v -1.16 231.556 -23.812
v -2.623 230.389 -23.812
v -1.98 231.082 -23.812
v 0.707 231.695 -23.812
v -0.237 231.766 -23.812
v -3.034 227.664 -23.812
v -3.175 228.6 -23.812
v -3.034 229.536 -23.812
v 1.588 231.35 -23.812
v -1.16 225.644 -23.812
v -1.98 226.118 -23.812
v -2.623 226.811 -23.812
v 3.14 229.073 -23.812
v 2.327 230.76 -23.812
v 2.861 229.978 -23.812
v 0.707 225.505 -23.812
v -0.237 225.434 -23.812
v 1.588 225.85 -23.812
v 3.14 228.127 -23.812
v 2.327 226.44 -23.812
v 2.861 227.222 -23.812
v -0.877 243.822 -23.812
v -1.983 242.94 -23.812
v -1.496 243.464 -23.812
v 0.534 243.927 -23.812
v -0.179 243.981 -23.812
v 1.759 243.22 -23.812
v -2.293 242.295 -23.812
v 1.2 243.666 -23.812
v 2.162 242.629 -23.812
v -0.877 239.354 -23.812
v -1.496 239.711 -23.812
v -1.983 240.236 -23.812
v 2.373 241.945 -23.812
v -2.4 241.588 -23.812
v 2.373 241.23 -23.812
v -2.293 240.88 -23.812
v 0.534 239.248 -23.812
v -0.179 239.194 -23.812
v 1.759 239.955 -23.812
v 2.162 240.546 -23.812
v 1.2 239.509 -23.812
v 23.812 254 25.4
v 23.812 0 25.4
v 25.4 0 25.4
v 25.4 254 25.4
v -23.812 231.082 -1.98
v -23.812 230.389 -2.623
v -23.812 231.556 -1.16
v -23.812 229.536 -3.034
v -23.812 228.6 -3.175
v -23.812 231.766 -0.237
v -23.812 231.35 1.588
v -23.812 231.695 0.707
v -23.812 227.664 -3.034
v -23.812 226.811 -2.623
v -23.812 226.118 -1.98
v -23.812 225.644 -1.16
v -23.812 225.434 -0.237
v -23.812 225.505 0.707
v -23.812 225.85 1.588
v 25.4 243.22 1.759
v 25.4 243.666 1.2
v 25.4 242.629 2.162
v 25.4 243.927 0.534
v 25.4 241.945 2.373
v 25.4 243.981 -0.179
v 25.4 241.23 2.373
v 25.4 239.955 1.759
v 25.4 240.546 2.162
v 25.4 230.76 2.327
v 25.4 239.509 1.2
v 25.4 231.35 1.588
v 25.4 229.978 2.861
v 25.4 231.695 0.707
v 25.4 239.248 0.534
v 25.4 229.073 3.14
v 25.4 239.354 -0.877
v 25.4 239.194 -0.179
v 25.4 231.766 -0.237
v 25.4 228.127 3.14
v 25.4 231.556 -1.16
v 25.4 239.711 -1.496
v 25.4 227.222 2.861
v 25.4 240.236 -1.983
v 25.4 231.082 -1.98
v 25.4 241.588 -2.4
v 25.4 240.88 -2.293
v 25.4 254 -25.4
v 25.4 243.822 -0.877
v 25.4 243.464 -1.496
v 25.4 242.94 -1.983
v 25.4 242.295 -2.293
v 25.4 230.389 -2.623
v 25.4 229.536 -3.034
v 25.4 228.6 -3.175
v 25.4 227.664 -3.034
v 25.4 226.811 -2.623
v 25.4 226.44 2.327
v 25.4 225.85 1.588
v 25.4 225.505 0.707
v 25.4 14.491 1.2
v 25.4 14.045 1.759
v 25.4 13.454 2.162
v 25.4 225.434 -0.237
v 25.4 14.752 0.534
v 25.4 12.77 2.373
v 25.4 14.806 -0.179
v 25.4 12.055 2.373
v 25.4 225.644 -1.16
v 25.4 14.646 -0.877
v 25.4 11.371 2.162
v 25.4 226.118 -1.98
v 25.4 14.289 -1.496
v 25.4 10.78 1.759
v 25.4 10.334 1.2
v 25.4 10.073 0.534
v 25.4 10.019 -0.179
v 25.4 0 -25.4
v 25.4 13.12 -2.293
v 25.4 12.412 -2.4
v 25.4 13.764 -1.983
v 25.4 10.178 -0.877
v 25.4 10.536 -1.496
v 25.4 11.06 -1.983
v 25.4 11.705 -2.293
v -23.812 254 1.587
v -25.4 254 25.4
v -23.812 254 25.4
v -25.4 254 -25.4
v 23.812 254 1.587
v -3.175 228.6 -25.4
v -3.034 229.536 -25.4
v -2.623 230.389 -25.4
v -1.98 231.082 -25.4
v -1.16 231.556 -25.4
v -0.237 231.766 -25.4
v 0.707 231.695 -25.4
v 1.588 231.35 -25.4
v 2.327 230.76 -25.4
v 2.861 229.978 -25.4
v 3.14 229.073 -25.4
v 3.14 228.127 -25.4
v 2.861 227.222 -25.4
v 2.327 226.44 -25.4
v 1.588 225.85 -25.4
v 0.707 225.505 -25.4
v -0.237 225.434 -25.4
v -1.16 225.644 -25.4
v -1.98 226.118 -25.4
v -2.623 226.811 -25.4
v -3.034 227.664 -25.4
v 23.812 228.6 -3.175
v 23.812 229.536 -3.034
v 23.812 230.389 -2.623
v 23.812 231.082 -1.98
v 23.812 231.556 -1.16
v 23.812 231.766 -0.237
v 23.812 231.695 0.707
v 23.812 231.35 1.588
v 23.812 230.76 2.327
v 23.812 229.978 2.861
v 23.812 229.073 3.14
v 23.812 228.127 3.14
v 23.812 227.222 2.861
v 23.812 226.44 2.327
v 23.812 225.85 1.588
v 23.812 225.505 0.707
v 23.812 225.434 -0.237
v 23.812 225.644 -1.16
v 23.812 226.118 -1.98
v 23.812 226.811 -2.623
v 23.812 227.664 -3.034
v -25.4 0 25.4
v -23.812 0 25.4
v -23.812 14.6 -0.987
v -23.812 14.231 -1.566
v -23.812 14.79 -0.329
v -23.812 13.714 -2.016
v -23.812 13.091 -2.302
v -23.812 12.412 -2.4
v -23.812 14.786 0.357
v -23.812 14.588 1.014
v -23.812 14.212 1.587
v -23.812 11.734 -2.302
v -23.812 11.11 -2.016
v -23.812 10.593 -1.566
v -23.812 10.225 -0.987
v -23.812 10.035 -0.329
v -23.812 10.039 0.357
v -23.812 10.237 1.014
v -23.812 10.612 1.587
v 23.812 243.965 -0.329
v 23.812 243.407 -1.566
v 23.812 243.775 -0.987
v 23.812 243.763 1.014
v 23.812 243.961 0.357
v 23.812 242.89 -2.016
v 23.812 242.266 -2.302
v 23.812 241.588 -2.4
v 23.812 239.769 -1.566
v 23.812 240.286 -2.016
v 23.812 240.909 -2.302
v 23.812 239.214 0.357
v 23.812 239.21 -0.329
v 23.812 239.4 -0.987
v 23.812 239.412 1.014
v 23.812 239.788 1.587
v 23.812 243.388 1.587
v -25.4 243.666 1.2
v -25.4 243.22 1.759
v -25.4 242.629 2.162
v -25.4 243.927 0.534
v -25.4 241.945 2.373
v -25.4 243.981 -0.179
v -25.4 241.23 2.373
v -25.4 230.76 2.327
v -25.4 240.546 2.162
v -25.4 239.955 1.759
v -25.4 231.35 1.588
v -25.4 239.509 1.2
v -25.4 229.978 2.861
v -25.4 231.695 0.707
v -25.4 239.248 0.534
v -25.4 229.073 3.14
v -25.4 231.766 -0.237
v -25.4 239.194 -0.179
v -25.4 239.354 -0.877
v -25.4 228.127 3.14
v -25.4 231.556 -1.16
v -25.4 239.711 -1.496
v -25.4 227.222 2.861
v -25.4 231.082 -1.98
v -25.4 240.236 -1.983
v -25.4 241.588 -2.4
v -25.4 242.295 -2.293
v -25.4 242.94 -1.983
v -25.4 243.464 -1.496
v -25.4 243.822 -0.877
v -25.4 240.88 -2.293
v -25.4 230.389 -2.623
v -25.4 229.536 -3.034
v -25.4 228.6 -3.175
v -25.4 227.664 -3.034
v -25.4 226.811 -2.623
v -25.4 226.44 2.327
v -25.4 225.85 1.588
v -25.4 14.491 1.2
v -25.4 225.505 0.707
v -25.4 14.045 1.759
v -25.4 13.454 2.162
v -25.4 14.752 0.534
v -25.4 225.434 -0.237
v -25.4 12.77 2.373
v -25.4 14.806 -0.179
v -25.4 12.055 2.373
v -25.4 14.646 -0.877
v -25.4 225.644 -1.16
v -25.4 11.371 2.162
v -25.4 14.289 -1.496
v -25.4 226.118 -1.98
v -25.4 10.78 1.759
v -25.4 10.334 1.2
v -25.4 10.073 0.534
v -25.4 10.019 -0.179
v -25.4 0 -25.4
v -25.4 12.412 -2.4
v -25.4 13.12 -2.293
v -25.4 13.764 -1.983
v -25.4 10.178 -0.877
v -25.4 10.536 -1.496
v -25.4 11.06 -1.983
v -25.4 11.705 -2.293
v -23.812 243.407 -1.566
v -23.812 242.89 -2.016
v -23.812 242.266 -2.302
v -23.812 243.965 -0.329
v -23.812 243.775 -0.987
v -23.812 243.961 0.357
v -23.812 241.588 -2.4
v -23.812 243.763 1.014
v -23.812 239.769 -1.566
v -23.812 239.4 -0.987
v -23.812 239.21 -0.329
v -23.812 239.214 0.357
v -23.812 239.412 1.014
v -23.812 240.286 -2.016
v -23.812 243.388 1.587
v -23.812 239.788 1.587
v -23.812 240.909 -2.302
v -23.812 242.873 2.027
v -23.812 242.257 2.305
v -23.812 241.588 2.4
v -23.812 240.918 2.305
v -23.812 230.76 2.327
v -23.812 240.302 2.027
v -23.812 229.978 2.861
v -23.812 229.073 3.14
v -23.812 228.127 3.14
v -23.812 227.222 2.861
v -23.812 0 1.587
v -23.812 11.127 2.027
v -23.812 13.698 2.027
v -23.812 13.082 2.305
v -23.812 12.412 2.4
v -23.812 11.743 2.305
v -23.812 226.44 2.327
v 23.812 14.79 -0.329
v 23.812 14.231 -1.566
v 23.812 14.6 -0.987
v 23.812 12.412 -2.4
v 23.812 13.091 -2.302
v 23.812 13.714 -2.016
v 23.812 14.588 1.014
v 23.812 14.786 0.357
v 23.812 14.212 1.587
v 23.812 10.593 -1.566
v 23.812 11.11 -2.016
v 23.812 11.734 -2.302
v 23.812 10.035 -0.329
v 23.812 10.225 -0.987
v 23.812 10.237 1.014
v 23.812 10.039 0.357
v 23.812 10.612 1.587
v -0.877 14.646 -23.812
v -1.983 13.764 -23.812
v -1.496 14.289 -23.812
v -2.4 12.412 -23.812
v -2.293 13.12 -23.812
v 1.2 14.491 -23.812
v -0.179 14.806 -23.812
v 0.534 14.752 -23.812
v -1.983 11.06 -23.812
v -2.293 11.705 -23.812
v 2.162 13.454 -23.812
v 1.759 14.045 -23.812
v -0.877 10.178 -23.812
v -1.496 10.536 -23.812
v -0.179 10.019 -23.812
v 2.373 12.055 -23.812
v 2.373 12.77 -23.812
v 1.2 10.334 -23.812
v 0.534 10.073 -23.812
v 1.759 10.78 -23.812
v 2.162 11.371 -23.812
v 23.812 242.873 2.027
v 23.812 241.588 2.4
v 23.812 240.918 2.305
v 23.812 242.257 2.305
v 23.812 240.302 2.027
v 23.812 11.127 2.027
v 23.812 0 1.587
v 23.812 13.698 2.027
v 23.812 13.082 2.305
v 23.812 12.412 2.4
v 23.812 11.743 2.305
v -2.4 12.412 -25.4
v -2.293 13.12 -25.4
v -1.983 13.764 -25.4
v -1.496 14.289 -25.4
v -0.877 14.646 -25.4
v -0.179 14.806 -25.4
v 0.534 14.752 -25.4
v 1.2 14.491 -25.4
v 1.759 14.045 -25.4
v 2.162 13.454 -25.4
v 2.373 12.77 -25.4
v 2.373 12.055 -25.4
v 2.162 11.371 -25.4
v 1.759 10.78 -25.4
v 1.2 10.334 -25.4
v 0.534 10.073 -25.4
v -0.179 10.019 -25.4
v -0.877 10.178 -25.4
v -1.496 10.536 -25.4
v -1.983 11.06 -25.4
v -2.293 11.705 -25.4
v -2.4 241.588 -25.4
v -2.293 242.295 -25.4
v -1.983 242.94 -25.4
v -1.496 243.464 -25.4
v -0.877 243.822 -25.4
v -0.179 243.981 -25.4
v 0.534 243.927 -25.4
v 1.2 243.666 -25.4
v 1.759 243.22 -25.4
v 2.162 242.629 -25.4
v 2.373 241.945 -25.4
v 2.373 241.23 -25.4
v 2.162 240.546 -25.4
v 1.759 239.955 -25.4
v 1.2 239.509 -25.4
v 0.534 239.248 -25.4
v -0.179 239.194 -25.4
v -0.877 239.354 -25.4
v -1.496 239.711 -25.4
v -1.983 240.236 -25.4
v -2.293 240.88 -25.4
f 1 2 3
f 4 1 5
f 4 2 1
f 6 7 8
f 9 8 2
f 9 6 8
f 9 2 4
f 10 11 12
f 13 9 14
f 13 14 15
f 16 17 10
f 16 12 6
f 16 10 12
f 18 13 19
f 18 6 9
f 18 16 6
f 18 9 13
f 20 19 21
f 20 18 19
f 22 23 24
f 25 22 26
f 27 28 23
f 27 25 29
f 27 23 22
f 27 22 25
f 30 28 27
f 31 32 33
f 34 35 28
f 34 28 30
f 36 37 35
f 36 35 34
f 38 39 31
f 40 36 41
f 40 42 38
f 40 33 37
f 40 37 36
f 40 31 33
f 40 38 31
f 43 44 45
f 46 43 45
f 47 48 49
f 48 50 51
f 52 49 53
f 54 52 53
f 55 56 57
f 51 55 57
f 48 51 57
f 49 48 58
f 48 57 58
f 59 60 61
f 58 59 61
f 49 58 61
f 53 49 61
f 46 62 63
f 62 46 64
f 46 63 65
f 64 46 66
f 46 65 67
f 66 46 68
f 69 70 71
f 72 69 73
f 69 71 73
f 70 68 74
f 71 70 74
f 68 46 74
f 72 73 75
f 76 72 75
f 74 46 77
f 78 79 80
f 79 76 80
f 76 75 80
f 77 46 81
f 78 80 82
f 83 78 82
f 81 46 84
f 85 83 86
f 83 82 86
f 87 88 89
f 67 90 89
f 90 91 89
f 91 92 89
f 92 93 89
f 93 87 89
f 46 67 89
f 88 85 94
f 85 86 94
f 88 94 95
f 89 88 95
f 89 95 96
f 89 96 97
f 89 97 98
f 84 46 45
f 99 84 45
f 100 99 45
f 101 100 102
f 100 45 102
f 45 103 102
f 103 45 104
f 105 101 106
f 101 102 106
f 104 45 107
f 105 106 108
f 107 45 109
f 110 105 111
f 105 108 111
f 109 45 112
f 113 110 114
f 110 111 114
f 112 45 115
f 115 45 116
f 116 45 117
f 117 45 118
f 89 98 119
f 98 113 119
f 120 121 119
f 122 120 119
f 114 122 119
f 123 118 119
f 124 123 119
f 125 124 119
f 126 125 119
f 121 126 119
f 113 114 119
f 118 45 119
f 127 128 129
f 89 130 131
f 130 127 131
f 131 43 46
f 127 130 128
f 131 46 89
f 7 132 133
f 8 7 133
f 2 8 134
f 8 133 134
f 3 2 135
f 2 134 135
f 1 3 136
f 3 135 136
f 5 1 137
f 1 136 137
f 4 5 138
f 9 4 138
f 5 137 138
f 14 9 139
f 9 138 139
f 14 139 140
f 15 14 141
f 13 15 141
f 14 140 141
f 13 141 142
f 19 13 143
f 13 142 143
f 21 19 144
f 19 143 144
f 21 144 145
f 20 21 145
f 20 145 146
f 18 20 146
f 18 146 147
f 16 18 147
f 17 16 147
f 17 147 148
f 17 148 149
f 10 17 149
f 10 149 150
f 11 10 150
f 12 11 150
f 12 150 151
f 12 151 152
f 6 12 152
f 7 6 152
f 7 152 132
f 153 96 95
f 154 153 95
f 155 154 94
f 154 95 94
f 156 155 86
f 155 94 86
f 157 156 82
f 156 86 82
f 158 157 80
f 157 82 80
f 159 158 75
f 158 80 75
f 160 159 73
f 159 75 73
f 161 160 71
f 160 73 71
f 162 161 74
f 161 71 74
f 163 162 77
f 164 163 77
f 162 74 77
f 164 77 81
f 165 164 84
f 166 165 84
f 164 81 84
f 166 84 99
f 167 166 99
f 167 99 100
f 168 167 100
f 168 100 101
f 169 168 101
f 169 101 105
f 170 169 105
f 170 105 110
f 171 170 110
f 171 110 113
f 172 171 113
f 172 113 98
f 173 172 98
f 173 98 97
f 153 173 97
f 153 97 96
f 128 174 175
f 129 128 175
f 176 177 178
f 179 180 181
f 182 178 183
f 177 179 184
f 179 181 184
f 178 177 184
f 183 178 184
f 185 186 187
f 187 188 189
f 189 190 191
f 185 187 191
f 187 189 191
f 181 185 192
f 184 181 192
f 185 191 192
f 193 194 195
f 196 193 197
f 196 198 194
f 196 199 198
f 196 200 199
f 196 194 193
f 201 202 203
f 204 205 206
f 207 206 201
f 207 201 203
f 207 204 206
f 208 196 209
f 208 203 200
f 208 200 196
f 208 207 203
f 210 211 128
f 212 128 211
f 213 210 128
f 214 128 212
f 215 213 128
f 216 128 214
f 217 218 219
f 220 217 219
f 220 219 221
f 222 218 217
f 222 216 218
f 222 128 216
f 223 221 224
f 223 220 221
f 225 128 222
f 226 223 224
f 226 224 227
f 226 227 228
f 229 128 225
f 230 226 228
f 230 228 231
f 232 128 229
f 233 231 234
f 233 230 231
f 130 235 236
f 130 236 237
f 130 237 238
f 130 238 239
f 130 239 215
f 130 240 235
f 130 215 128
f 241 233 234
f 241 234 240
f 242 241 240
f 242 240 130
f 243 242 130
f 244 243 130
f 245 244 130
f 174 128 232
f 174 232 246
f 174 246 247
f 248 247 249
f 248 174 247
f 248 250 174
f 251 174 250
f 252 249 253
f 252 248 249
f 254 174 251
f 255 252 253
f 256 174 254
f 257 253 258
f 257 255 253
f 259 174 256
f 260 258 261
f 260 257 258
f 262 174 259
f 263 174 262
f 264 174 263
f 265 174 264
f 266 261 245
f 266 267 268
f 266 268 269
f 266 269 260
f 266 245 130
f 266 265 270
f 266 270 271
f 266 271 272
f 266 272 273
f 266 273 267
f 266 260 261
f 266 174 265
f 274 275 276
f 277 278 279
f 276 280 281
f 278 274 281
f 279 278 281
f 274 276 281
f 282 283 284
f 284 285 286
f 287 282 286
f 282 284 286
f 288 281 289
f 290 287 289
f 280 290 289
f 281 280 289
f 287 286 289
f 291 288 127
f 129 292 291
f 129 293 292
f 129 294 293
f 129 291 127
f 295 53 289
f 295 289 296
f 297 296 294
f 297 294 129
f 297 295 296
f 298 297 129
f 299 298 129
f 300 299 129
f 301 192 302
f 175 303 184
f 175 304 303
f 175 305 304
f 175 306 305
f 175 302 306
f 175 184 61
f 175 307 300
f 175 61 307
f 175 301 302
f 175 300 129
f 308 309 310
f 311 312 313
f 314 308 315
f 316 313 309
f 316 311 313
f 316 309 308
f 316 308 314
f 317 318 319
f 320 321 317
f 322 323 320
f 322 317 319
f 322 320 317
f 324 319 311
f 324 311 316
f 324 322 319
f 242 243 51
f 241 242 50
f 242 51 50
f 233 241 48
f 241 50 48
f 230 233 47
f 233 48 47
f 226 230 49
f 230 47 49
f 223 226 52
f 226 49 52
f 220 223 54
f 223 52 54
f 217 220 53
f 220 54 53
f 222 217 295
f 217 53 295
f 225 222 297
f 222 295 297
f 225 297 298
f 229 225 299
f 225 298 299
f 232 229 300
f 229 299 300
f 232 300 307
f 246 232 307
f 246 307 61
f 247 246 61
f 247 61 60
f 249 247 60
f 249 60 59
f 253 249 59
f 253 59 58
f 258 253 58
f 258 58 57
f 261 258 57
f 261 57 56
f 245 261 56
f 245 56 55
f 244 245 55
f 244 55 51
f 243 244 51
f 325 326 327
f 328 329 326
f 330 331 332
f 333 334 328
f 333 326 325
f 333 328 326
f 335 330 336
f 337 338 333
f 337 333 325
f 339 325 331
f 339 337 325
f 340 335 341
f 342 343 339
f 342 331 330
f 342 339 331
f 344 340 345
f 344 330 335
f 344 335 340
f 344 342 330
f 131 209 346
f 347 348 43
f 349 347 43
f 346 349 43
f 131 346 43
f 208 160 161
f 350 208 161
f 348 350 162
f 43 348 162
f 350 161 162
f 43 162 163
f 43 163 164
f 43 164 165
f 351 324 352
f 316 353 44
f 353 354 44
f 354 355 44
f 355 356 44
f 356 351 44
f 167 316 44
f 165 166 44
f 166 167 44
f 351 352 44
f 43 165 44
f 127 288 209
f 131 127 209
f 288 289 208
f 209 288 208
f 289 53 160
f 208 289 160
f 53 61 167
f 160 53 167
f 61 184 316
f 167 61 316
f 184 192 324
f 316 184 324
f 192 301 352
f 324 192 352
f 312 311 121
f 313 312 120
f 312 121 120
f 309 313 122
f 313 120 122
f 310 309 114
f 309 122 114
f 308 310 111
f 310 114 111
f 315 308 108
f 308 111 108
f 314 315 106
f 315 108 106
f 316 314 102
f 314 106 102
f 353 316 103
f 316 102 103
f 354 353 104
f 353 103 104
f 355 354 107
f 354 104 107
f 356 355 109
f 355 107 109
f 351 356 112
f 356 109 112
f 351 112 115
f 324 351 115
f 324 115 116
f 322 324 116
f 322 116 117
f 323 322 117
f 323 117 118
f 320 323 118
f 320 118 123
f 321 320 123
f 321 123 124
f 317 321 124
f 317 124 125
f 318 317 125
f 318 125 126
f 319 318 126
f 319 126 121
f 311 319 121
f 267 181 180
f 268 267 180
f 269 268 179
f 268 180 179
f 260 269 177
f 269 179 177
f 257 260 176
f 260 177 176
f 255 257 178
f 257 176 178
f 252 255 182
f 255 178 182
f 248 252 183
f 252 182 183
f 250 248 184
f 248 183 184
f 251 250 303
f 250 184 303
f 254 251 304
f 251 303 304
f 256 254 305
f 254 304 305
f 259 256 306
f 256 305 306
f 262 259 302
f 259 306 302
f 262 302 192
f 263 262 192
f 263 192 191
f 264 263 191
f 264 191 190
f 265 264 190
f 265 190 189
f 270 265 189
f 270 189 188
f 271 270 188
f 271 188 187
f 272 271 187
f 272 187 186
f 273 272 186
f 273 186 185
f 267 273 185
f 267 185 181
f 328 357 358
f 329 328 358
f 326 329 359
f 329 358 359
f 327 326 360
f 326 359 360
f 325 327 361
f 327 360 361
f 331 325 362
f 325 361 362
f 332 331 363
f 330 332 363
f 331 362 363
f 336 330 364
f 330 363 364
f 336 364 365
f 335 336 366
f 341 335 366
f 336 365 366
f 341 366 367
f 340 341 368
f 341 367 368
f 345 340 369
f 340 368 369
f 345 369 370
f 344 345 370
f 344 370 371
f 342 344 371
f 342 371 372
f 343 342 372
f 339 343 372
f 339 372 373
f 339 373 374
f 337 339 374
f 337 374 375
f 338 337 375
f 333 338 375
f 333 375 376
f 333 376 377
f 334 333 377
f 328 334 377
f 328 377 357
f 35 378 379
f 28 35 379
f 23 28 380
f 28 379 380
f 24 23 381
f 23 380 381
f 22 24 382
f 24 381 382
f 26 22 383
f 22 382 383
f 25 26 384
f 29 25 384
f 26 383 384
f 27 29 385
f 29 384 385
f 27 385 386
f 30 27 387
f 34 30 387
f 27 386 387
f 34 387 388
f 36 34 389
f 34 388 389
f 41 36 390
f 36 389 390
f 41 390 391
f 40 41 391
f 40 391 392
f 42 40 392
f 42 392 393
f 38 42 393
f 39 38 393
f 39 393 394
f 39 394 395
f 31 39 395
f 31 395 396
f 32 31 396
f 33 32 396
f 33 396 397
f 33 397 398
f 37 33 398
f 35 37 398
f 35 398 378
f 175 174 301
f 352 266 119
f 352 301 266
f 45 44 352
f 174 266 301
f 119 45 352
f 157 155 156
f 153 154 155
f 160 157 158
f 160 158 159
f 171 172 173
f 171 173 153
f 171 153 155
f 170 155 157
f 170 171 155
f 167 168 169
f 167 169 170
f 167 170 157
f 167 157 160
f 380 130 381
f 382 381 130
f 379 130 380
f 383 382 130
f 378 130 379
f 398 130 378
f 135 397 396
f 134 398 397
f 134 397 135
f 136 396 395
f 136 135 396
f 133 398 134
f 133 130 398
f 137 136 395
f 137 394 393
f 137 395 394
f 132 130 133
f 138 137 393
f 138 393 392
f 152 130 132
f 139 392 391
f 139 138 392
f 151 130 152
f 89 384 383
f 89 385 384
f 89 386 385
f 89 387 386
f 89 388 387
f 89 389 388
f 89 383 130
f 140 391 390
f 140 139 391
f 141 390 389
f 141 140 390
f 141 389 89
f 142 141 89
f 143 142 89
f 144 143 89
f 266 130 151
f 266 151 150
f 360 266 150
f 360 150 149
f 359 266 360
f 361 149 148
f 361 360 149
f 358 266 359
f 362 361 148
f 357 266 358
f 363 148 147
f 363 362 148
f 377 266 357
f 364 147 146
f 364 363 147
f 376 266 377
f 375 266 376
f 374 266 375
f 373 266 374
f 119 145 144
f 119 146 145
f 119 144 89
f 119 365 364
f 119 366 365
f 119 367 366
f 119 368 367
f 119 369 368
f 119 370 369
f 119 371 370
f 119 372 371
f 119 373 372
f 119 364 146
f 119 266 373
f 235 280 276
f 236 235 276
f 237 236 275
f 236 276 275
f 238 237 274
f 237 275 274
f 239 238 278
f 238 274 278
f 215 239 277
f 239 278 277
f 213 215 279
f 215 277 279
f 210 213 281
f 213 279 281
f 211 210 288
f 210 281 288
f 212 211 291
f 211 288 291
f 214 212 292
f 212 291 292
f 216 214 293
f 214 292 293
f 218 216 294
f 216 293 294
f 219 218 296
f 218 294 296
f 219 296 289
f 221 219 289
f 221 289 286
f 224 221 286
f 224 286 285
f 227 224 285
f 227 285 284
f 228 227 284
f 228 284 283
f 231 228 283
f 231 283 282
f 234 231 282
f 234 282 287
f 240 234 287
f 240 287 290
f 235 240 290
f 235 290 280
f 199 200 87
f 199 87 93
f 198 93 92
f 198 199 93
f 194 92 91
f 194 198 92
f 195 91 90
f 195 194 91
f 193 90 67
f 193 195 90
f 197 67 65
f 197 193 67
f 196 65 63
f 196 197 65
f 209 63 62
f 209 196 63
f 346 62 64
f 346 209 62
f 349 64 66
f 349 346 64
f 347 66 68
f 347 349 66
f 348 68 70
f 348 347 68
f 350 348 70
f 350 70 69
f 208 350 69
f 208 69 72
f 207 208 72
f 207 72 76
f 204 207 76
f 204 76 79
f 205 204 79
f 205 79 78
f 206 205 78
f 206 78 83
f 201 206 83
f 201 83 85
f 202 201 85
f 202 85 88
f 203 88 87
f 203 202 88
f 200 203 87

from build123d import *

# Parameters (mm, degrees)
SKETCH1_W               = 50.8
SKETCH1_H               = 50.8
SKETCH1_W_2             = 47.625
SKETCH1_H_2             = 47.625
BOSS_EXTRUDE1_DEPTH     = 254
SKETCH4_R               = 2.3999952
CUT_EXTRUDE1_DEPTH      = 50.2125
CUT_EXTRUDE1_DEPTH_BACK = 2.5875
SKETCH5_R               = 2.3999952
CUT_EXTRUDE2_DEPTH      = 51.8
SKETCH6_R               = 2.3999952
CUT_EXTRUDE3_DEPTH      = 1
CUT_EXTRUDE3_DEPTH_BACK = 51.8
SKETCH7_R               = 2.3999952
CUT_EXTRUDE4_DEPTH      = 1
CUT_EXTRUDE4_DEPTH_BACK = 51.8
SKETCH8_R               = 3.175
CUT_EXTRUDE5_DEPTH      = 1
CUT_EXTRUDE5_DEPTH_BACK = 51.8
SKETCH9_R               = 3.175
CUT_EXTRUDE6_DEPTH      = 1
CUT_EXTRUDE6_DEPTH_BACK = 51.8
CUT_EXTRUDE7_REACH      = 256
SKETCH10_W              = 47.625
SKETCH10_H              = 1.5875
SKETCH11_W              = 47.625
SKETCH11_H              = 25.4
BOSS_EXTRUDE2_DEPTH     = 254


with BuildPart() as part:
    # Sketch1 → Boss-Extrude1 (new body)
    with BuildSketch(Plane(origin=(0, 0, 0), x_dir=(1, 0, 0), z_dir=(0, 1, 0))):
        Rectangle(SKETCH1_W, SKETCH1_H)
        Rectangle(SKETCH1_W_2, SKETCH1_H_2, mode=Mode.SUBTRACT)
    extrude(amount=BOSS_EXTRUDE1_DEPTH)

    # Sketch4 → Cut-Extrude1 (cut, two sides)
    with BuildSketch(Plane(origin=(-23.8125, 0, 0), x_dir=(0, 0, -1), z_dir=(1, 0, 0))) as cut_extrude1_sk:
        with Locations((0, 241.587599882)):
            Circle(SKETCH4_R)
    extrude(amount=CUT_EXTRUDE1_DEPTH, mode=Mode.SUBTRACT)
    extrude(cut_extrude1_sk.sketch, amount=-CUT_EXTRUDE1_DEPTH_BACK, mode=Mode.SUBTRACT)

    # Sketch5 → Cut-Extrude2 (cut, through all)
    with BuildSketch(Plane(origin=(0, 0, -25.4), x_dir=(-1, 0, 0), z_dir=(0, 0, -1))):
        with Locations((0, 241.587599882)):
            Circle(SKETCH5_R)
    extrude(amount=-CUT_EXTRUDE2_DEPTH, mode=Mode.SUBTRACT)

    # Sketch6 → Cut-Extrude3 (cut, two sides)
    with BuildSketch(Plane(origin=(25.4, 0, 0), x_dir=(0, 0, -1), z_dir=(1, 0, 0))) as cut_extrude3_sk:
        with Locations((0, 12.412400118)):
            Circle(SKETCH6_R)
    extrude(amount=CUT_EXTRUDE3_DEPTH, mode=Mode.SUBTRACT)
    extrude(cut_extrude3_sk.sketch, amount=-CUT_EXTRUDE3_DEPTH_BACK, mode=Mode.SUBTRACT)

    # Sketch7 → Cut-Extrude4 (cut, two sides)
    with BuildSketch(Plane(origin=(0, 0, -25.4), x_dir=(-1, 0, 0), z_dir=(0, 0, -1))) as cut_extrude4_sk:
        with Locations((0, 12.412400118)):
            Circle(SKETCH7_R)
    extrude(amount=CUT_EXTRUDE4_DEPTH, mode=Mode.SUBTRACT)
    extrude(cut_extrude4_sk.sketch, amount=-CUT_EXTRUDE4_DEPTH_BACK, mode=Mode.SUBTRACT)

    # Sketch8 → Cut-Extrude5 (cut, two sides)
    with BuildSketch(Plane(origin=(0, 0, -25.4), x_dir=(-1, 0, 0), z_dir=(0, 0, -1))) as cut_extrude5_sk:
        with Locations((0, 228.6)):
            Circle(SKETCH8_R)
    extrude(amount=CUT_EXTRUDE5_DEPTH, mode=Mode.SUBTRACT)
    extrude(cut_extrude5_sk.sketch, amount=-CUT_EXTRUDE5_DEPTH_BACK, mode=Mode.SUBTRACT)

    # Sketch9 → Cut-Extrude6 (cut, two sides)
    with BuildSketch(Plane(origin=(25.4, 0, 0), x_dir=(0, 0, -1), z_dir=(1, 0, 0))) as cut_extrude6_sk:
        with Locations((0, 228.6)):
            Circle(SKETCH9_R)
    extrude(amount=CUT_EXTRUDE6_DEPTH, mode=Mode.SUBTRACT)
    extrude(cut_extrude6_sk.sketch, amount=-CUT_EXTRUDE6_DEPTH_BACK, mode=Mode.SUBTRACT)

    # Sketch10 → Cut-Extrude7 (cut, up to next)
    with BuildSketch(Plane.XZ, mode=Mode.PRIVATE) as cut_extrude7_sk1:
        with Locations((0, 24.60625)):
            Rectangle(SKETCH10_W, SKETCH10_H)
    cut_extrude7_tool1 = extrude(cut_extrude7_sk1.sketch, amount=-CUT_EXTRUDE7_REACH, mode=Mode.PRIVATE) & part.part
    add(cut_extrude7_tool1.solids().sort_by_distance((0, 0, 24.60625))[0], mode=Mode.SUBTRACT)

    # Sketch11 → Boss-Extrude2 (add, through all)
    with BuildSketch(Plane.XZ):
        with Locations((0, -11.1125)):
            Rectangle(SKETCH11_W, SKETCH11_H)
    extrude(amount=-BOSS_EXTRUDE2_DEPTH)


solid = part.part
